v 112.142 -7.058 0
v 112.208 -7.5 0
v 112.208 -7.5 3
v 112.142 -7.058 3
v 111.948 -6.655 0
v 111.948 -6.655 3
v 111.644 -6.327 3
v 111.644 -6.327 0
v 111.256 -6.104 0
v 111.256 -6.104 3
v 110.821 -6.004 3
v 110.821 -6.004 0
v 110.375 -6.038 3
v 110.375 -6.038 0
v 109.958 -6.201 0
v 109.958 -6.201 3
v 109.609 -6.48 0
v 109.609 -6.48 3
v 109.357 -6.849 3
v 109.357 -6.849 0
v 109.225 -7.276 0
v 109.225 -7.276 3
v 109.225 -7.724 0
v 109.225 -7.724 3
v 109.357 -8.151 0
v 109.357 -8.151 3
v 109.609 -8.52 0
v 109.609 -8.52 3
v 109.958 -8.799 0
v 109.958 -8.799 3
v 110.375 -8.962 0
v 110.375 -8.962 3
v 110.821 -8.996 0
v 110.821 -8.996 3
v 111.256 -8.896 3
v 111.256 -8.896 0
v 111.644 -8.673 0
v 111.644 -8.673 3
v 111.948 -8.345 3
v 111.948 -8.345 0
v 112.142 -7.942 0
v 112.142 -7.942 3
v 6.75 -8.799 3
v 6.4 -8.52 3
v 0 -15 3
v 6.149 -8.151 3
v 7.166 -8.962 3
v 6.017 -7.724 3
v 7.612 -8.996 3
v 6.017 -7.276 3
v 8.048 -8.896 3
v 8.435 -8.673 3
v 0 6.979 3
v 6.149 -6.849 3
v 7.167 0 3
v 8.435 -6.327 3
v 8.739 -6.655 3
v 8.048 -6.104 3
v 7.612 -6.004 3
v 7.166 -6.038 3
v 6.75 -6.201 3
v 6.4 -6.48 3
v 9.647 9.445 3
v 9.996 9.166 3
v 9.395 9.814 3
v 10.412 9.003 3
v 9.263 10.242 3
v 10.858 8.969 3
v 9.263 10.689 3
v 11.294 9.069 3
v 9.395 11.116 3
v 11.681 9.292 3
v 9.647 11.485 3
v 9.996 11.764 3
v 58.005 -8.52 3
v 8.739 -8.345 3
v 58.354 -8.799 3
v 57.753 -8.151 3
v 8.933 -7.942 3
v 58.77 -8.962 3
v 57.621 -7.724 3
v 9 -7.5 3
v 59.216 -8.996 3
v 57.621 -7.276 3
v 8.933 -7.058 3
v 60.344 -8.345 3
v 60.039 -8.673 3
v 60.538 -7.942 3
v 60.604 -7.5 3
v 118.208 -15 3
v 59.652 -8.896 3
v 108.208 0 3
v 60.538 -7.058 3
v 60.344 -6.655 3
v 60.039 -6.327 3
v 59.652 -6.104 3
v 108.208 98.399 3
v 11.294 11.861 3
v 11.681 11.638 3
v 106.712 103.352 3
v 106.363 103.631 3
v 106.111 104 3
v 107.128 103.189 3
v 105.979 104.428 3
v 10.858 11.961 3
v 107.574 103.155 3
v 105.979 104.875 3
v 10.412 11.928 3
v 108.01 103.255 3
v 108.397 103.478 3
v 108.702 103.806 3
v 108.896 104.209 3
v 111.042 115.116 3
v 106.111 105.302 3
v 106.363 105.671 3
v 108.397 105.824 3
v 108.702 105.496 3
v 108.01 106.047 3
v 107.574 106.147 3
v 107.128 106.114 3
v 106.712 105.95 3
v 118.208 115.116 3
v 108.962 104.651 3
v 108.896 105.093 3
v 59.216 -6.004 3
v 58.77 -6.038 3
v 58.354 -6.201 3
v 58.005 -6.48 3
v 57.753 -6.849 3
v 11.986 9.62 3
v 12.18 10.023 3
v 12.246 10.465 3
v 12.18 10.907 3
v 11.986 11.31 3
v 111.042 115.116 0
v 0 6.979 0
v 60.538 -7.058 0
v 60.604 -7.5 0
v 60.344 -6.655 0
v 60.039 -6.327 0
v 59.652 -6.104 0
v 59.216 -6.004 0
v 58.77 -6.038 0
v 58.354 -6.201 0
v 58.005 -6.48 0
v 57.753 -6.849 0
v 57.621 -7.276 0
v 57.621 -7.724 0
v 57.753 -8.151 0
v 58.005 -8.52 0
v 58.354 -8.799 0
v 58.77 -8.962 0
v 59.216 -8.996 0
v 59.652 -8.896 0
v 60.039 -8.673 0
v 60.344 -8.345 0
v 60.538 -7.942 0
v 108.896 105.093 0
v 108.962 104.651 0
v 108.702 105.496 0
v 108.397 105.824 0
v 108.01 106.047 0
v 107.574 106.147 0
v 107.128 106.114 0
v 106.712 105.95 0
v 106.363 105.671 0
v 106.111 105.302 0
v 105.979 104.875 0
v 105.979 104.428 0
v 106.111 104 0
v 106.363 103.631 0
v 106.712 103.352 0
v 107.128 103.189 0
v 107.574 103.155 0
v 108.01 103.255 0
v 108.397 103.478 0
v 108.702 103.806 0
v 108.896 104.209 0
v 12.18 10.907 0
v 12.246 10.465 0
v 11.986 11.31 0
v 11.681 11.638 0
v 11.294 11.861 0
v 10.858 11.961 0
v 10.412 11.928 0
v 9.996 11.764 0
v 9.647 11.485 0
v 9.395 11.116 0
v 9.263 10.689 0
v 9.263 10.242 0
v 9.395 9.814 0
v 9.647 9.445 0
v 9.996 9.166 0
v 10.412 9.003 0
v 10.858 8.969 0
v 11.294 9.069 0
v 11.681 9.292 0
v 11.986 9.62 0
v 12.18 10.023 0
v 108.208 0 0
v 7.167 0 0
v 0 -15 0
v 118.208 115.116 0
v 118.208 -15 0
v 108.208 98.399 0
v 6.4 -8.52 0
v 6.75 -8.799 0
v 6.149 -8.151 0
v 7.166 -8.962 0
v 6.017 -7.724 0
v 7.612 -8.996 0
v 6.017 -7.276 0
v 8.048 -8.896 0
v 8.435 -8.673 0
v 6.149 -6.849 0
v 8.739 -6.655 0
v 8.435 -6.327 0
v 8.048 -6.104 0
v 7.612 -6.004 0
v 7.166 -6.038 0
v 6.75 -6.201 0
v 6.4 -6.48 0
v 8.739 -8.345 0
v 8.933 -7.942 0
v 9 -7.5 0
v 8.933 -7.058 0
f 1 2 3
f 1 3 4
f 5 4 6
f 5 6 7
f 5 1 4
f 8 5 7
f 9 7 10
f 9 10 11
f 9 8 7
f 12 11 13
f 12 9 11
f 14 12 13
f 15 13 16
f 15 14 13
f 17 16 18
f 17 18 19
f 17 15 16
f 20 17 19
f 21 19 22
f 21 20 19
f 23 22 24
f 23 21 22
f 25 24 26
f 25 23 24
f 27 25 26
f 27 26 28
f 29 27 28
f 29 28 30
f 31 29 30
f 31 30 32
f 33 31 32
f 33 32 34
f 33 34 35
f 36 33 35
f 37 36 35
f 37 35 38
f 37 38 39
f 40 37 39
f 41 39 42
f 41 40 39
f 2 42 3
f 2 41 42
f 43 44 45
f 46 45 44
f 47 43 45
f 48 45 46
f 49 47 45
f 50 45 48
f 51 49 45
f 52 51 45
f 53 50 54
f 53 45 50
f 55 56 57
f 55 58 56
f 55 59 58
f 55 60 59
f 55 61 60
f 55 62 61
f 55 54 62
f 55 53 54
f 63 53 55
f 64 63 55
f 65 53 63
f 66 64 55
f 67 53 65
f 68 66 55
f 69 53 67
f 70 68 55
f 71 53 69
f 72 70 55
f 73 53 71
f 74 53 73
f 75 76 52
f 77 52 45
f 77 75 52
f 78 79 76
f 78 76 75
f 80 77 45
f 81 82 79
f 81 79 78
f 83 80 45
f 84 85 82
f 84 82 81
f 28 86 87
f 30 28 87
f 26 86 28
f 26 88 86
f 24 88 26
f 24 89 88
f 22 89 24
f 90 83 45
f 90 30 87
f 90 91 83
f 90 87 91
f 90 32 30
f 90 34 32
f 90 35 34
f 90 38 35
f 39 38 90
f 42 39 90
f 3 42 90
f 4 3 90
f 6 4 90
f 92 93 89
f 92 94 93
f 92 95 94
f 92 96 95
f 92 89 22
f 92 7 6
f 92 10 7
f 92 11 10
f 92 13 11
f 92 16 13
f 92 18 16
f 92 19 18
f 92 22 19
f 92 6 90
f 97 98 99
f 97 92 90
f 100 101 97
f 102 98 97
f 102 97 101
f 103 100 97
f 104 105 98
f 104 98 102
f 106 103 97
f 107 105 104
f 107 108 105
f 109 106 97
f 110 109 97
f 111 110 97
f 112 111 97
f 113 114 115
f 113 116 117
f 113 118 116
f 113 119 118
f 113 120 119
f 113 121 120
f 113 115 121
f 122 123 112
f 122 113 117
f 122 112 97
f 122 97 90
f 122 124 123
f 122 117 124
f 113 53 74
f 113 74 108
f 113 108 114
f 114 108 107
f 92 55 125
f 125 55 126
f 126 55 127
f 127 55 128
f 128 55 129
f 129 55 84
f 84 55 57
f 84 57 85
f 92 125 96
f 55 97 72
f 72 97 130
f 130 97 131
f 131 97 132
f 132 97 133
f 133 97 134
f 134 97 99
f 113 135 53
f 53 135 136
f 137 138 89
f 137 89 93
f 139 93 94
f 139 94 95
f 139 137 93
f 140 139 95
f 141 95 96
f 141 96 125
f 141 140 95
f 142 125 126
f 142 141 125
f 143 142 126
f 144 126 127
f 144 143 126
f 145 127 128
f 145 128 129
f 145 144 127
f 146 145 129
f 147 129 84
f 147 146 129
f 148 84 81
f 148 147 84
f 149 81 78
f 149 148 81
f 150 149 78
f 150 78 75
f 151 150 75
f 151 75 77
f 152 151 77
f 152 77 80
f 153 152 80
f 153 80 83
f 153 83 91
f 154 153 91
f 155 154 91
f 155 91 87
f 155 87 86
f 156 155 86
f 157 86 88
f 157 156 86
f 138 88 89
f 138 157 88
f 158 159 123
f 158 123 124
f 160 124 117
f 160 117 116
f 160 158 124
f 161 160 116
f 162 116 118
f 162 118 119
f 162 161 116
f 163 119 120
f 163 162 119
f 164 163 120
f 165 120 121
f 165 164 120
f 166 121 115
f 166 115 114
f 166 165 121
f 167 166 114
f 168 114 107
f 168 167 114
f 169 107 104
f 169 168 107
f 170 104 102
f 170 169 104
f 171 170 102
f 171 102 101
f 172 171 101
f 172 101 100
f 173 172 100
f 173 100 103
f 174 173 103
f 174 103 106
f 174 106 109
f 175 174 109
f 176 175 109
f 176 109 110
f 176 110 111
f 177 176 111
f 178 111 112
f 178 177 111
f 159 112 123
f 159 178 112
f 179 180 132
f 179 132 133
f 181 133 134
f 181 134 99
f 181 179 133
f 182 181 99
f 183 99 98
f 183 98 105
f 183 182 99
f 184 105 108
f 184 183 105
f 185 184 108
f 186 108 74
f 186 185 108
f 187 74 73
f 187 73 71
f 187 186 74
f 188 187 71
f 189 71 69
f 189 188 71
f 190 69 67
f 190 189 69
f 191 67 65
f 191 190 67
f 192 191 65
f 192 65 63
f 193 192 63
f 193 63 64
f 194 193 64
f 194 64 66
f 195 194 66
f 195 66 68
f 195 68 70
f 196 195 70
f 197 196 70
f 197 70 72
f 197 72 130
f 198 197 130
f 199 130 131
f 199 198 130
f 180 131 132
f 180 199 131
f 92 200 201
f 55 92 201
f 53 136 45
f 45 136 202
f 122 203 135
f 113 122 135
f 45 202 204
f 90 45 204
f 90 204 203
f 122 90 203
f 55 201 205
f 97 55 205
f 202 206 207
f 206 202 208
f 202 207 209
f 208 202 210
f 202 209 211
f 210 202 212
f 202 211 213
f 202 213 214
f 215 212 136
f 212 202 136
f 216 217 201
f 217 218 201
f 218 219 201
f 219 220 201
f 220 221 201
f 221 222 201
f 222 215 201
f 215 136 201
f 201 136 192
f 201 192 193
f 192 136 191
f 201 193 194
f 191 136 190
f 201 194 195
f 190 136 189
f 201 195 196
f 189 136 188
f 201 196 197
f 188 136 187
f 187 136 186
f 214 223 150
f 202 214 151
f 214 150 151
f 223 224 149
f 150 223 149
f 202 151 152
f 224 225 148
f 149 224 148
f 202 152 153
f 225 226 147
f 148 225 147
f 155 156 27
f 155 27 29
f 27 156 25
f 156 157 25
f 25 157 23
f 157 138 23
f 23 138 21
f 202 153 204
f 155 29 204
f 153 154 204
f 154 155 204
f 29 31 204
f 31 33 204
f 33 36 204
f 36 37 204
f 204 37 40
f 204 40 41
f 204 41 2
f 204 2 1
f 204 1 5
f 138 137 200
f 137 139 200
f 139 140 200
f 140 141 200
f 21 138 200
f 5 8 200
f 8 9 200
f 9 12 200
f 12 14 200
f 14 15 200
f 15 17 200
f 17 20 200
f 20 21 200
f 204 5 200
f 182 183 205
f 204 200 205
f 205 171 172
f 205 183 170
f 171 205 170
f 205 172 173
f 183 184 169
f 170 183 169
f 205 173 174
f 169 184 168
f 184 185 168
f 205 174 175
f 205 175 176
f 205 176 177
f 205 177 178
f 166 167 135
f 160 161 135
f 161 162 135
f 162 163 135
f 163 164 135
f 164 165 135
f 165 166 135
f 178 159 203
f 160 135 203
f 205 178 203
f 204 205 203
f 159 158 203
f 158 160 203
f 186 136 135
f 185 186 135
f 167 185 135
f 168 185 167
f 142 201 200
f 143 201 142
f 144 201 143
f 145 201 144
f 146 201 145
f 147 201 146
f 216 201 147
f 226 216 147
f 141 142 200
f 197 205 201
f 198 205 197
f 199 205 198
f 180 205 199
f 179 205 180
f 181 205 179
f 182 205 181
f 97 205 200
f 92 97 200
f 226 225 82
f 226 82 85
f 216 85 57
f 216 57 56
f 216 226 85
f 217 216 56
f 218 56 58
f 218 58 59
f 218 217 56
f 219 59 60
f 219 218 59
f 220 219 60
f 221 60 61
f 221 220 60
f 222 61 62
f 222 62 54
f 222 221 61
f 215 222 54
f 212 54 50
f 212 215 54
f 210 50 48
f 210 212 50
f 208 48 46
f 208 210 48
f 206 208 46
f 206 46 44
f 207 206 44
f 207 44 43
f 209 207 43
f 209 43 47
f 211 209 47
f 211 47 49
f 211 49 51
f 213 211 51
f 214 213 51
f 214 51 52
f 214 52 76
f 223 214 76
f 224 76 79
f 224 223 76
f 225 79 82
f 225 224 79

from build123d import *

# Parameters (mm, degrees)
SKETCH2_R           = 1.5
BOSS_EXTRUDE1_DEPTH = 3


with BuildPart() as part:
    # Sketch2 → Boss-Extrude1 (new body)
    with BuildSketch(Plane.XY):
        Polygon((0, 6.979195336), (0, -15), (118.208469634, -15), (118.208469634, 115.11627907), (111.041802967, 115.11627907), align=None)
        Polygon((108.208469634, 0), (7.166666667, 0), (108.208469634, 98.398671636), align=None, mode=Mode.SUBTRACT)
        with Locations((107.462245122, 104.651162791)):
            Circle(SKETCH2_R, mode=Mode.SUBTRACT)
        with Locations((10.746224512, 10.465116279)):
            Circle(SKETCH2_R, mode=Mode.SUBTRACT)
        with Locations((110.708469634, -7.5)):
            Circle(SKETCH2_R, mode=Mode.SUBTRACT)
        with Locations((7.5, -7.5)):
            Circle(SKETCH2_R, mode=Mode.SUBTRACT)
        with Locations((59.104234817, -7.5)):
            Circle(SKETCH2_R, mode=Mode.SUBTRACT)
    extrude(amount=BOSS_EXTRUDE1_DEPTH)


solid = part.part
